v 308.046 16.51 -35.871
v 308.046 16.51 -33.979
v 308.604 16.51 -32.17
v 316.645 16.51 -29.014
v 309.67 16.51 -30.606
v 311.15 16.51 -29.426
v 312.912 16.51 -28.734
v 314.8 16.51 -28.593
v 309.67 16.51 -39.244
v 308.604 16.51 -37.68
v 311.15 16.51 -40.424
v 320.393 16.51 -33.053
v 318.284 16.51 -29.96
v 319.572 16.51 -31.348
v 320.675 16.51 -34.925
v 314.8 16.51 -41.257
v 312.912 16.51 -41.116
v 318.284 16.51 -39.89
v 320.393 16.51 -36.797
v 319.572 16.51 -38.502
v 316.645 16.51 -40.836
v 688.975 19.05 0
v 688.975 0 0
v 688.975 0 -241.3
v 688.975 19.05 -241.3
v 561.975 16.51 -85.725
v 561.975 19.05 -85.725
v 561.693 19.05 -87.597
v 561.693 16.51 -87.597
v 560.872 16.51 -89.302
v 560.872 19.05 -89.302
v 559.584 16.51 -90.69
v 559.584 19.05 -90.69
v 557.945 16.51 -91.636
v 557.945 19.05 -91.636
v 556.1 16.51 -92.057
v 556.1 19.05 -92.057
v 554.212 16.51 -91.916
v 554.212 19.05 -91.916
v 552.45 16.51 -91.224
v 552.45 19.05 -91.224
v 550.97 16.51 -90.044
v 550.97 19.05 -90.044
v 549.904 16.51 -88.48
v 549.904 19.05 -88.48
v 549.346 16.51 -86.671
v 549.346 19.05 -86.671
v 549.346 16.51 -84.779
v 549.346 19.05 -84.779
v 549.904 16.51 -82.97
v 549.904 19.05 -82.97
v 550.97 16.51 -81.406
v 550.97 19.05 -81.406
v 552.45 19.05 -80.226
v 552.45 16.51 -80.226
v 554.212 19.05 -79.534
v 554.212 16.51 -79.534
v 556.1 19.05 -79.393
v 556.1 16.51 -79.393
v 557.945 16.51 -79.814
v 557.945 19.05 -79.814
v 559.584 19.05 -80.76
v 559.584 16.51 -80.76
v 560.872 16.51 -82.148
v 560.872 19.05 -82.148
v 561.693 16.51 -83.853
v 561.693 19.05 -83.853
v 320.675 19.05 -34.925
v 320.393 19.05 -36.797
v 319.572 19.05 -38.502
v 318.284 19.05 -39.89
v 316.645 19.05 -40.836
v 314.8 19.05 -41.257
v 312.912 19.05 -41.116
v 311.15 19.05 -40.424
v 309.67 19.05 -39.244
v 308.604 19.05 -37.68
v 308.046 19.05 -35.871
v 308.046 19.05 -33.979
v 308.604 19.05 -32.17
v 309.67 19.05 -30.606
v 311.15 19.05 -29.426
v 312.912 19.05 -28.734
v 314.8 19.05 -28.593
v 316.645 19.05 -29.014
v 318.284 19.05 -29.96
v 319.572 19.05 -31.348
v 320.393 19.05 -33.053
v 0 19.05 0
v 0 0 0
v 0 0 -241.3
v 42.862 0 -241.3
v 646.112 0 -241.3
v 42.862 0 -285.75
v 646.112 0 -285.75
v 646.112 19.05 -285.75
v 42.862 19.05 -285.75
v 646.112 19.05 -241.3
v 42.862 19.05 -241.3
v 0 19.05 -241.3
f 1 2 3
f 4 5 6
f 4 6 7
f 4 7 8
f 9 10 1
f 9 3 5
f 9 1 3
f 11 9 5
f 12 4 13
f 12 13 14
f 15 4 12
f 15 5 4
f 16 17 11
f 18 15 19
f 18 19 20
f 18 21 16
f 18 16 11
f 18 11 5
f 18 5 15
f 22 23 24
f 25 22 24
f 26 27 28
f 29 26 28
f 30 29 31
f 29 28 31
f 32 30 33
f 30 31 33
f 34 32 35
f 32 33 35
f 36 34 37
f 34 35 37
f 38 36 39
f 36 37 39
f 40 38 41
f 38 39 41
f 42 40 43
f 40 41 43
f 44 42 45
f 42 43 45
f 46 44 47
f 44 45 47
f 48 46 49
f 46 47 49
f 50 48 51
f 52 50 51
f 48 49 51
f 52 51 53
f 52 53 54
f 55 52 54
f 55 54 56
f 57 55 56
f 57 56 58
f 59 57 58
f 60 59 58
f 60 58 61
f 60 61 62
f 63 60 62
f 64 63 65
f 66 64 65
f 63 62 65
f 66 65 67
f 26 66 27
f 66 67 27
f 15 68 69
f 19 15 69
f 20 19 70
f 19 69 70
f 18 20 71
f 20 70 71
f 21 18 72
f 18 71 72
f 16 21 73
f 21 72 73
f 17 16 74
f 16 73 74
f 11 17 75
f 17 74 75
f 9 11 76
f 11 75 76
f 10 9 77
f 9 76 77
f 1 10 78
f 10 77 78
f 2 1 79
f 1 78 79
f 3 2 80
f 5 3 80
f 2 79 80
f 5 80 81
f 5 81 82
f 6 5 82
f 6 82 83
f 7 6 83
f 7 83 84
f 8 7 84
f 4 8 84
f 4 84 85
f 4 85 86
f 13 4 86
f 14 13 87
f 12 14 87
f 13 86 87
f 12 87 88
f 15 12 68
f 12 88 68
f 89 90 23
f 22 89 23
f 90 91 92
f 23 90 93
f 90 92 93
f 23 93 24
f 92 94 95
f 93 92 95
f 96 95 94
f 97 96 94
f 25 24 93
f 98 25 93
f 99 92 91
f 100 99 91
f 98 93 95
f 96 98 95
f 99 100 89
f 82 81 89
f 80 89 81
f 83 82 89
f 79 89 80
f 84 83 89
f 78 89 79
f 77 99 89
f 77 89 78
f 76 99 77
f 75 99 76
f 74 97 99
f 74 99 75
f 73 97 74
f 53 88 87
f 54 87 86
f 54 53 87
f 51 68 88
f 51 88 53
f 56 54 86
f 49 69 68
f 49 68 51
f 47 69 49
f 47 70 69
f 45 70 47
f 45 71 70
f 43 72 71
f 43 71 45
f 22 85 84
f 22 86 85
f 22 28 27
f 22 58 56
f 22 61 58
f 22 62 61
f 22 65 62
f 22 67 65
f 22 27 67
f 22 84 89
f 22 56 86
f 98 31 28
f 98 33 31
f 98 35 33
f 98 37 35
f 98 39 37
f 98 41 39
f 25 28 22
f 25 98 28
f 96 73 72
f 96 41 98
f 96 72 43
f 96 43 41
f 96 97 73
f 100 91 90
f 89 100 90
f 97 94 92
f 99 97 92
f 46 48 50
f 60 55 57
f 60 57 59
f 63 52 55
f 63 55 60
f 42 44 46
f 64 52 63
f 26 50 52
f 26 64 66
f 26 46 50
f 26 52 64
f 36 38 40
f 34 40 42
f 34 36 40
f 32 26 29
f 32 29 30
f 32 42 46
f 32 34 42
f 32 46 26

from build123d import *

# Parameters (mm, degrees)
BOSS_EXTRUDE1_DEPTH = 19.05
SKETCH2_R           = 6.35
CUT_EXTRUDE1_DEPTH  = 2.54
SKETCH3_R           = 6.35
CUT_EXTRUDE2_DEPTH  = 2.54


with BuildPart() as part:
    # Sketch1 → Boss-Extrude1 (new body)
    with BuildSketch(Plane(origin=(0, 0, 0), x_dir=(1, 0, 0), z_dir=(0, 1, 0))):
        Polygon((0, 0), (688.975, 0), (688.975, 241.3), (646.1125, 241.3), (646.1125, 285.75), (42.8625, 285.75), (42.8625, 241.3), (0, 241.3), align=None)
    extrude(amount=BOSS_EXTRUDE1_DEPTH)

    # Sketch2 → Cut-Extrude1 (cut)
    with BuildSketch(Plane(origin=(0, 19.05, 0), x_dir=(1, 0, 0), z_dir=(0, 1, 0))):
        with Locations((555.625, 85.725)):
            Circle(SKETCH2_R)
    extrude(amount=-CUT_EXTRUDE1_DEPTH, mode=Mode.SUBTRACT)

    # Sketch3 → Cut-Extrude2 (cut)
    with BuildSketch(Plane(origin=(0, 19.05, 0), x_dir=(1, 0, 0), z_dir=(0, 1, 0))):
        with Locations((314.325, 34.925)):
            Circle(SKETCH3_R)
    extrude(amount=-CUT_EXTRUDE2_DEPTH, mode=Mode.SUBTRACT)


solid = part.part
